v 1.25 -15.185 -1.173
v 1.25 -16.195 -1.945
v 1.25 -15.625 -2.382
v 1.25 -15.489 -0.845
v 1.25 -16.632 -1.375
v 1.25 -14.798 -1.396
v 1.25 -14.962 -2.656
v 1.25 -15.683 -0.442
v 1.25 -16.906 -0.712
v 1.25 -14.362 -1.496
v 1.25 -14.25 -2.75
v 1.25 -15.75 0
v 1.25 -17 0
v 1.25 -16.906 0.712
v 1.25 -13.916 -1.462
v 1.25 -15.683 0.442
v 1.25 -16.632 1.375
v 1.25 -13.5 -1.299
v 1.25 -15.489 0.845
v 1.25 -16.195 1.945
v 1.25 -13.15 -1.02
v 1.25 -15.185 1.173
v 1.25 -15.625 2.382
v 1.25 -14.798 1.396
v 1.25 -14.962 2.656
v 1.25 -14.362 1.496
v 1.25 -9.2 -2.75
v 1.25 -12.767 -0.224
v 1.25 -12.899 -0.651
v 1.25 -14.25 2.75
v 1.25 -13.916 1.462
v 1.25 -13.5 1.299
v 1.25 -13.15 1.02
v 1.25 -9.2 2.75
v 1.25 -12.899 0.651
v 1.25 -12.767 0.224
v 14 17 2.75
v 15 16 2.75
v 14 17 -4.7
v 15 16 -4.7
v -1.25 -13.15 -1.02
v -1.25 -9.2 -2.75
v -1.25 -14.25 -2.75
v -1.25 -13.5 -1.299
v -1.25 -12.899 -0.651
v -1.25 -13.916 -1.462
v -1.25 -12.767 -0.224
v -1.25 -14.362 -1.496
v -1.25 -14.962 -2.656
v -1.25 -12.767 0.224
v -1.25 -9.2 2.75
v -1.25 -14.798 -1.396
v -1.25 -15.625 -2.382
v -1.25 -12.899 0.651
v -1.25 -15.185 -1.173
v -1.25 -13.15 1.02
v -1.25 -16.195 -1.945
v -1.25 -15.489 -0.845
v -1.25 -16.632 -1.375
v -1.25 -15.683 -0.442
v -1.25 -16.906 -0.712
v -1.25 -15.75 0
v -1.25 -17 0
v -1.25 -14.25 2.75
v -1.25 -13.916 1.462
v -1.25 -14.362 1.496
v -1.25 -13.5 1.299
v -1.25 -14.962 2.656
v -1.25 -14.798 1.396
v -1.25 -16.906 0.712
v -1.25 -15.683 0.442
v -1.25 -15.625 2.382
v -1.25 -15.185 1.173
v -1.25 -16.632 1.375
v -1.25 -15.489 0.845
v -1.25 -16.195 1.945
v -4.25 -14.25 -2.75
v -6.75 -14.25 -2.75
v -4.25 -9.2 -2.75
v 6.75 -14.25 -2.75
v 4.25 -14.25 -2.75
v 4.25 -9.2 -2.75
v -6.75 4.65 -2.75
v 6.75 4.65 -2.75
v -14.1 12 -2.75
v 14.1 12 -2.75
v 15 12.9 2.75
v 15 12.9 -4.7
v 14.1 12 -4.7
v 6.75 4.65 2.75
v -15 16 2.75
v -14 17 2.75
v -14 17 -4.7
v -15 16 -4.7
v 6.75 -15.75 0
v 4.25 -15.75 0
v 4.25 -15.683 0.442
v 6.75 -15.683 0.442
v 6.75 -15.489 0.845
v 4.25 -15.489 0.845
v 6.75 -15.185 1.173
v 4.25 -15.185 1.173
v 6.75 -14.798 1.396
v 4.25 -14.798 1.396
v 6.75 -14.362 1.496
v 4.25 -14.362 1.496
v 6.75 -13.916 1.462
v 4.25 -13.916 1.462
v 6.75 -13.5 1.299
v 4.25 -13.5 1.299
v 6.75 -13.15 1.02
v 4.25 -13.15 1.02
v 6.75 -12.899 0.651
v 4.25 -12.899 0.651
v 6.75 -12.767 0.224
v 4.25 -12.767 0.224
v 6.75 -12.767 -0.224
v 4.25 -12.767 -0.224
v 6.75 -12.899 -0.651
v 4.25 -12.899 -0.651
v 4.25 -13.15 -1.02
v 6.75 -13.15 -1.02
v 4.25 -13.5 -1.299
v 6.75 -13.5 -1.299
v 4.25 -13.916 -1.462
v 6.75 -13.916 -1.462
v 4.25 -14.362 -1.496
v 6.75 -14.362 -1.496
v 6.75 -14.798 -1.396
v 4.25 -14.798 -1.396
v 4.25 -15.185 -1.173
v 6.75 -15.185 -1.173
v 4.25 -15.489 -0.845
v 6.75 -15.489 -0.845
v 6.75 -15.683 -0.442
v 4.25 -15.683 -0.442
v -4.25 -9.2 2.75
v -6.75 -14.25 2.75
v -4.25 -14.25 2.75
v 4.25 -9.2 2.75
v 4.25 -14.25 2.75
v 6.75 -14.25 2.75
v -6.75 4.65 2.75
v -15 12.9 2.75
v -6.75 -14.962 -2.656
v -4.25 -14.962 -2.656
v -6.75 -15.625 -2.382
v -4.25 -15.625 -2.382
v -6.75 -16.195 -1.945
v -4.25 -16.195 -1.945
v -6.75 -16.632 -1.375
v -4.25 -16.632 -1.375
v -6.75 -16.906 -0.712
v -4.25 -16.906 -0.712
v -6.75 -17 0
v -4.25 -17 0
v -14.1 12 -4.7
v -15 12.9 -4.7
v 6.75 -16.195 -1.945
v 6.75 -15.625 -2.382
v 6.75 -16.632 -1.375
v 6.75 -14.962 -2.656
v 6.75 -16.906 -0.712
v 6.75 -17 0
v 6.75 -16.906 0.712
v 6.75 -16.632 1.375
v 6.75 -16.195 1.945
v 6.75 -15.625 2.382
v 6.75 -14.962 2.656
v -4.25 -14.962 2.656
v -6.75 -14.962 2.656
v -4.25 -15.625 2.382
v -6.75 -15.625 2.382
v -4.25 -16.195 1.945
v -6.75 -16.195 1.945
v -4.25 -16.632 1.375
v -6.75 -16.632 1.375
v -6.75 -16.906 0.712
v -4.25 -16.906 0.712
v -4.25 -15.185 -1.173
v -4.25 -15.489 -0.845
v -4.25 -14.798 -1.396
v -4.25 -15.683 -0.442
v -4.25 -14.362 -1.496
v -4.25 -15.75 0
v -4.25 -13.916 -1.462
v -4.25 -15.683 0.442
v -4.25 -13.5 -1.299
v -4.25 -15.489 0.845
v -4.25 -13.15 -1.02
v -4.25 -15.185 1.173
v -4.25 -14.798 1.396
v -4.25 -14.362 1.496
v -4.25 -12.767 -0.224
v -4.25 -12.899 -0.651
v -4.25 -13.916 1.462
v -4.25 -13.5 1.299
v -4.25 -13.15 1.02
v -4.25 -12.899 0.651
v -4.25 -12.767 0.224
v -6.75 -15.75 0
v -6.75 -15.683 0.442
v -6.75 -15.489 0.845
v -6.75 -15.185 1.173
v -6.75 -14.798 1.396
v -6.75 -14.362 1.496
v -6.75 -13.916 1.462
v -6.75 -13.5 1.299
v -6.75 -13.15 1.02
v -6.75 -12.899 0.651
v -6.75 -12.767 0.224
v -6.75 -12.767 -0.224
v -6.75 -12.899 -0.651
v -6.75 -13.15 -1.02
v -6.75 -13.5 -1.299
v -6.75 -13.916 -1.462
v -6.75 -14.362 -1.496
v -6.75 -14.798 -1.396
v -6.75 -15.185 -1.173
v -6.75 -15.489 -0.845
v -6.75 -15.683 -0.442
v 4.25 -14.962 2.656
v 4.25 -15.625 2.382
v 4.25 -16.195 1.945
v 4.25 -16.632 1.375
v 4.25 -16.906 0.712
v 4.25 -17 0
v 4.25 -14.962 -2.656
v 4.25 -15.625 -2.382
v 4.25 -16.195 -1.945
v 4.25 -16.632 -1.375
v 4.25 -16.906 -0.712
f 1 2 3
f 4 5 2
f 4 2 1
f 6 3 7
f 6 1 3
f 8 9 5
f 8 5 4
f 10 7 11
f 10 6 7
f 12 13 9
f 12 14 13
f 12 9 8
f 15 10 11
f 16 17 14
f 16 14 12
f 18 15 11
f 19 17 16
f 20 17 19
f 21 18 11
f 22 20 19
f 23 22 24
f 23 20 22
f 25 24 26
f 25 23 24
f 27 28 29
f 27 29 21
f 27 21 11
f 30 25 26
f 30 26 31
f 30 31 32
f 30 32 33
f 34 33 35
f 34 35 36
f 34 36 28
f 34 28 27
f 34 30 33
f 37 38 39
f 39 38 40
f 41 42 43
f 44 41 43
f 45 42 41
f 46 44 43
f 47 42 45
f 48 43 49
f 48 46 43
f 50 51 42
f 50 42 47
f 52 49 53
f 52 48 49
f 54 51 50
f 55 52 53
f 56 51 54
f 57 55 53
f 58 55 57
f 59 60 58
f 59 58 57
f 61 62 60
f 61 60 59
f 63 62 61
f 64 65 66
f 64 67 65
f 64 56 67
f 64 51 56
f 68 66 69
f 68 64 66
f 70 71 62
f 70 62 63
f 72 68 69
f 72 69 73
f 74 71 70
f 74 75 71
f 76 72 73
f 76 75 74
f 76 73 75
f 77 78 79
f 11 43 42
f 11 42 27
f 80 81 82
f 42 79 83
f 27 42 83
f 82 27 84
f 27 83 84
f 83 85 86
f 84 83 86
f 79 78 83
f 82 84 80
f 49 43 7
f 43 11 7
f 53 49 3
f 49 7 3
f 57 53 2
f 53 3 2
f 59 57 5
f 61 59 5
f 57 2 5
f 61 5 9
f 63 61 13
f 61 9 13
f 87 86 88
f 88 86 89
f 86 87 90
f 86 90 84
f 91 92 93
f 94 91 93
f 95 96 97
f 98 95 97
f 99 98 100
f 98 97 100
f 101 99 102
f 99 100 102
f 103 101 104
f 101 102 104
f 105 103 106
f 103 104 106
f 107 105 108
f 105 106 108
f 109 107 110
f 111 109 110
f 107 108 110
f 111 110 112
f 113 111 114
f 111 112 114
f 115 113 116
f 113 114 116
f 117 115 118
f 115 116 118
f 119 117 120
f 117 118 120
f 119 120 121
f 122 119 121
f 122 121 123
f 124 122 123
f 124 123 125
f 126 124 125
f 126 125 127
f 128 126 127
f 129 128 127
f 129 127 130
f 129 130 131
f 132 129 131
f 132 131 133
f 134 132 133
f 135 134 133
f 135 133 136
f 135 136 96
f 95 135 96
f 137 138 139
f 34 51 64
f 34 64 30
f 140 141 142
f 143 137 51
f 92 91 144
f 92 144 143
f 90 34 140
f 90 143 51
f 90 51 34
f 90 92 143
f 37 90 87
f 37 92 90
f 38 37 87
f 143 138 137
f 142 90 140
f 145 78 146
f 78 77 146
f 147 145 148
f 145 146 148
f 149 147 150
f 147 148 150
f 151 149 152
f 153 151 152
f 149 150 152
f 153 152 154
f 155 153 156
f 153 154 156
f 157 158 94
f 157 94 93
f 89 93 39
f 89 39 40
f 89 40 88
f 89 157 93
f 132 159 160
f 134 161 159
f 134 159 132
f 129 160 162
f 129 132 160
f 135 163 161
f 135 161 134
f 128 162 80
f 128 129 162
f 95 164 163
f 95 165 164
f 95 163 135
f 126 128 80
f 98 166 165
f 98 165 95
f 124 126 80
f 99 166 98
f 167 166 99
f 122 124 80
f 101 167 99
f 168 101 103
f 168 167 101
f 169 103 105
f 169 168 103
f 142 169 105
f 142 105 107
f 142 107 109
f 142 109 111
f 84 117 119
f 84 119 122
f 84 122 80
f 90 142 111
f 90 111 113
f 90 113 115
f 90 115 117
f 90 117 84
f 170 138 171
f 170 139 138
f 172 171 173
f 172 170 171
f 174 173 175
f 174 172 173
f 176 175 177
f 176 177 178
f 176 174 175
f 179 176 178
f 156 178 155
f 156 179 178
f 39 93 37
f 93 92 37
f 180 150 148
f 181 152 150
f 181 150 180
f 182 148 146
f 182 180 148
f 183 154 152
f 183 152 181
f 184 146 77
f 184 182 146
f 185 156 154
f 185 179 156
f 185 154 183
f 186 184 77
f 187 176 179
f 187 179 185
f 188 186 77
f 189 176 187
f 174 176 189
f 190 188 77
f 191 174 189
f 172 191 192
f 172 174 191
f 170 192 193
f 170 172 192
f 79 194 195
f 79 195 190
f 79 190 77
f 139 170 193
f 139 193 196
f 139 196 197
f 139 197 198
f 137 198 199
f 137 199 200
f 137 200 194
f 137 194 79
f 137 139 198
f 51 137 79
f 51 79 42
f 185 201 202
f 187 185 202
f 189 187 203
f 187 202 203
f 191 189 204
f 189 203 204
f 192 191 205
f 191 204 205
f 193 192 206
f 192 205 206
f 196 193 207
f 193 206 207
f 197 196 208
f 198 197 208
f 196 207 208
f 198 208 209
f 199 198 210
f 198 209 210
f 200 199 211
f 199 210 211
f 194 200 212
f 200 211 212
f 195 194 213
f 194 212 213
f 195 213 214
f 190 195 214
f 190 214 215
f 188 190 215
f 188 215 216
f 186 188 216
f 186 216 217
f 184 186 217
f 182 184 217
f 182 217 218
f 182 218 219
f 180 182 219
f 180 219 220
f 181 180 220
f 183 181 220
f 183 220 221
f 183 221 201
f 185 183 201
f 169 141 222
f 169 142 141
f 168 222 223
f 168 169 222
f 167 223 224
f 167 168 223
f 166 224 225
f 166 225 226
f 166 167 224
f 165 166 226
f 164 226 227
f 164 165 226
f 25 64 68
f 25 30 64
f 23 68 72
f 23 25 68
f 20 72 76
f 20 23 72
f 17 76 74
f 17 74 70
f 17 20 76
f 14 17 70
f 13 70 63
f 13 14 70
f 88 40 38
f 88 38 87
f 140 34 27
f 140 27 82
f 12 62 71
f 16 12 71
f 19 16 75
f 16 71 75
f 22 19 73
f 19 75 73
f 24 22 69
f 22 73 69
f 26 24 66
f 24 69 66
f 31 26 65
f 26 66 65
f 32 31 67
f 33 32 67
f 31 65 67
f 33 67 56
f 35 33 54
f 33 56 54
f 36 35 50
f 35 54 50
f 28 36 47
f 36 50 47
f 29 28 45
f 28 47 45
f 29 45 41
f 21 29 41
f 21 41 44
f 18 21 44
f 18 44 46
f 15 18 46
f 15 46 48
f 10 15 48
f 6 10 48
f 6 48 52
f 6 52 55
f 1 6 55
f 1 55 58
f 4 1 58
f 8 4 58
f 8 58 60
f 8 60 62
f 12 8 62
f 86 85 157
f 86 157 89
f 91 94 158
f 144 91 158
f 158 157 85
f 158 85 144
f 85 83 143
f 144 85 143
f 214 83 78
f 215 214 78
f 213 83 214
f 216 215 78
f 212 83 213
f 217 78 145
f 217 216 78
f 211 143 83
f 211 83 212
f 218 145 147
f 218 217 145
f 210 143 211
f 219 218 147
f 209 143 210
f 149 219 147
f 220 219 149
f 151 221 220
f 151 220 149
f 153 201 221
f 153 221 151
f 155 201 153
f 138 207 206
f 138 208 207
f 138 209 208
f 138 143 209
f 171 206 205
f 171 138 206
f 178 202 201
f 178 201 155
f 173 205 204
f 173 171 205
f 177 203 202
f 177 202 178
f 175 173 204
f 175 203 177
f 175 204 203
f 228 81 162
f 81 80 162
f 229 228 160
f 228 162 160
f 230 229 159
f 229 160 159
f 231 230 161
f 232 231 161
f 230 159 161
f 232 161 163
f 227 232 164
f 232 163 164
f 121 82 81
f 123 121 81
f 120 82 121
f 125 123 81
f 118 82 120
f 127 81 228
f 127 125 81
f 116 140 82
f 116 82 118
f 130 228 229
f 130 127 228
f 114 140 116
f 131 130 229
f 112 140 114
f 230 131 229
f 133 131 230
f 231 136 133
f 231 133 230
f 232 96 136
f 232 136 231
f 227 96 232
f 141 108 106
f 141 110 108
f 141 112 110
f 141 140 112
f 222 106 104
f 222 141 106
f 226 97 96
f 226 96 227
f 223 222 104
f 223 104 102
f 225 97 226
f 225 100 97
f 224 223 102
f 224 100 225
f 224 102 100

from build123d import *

# Parameters (mm, degrees)
F1_DEPTH = 2.75
F2_W     = 30
F2_H     = 5
F3_DEPTH = 1.95
F4_SIZE  = 8.24999
F5_SIZE  = 1
F6_R     = 2.74999
F8_D     = 3


# Not quite as in the source:
# - a fillet or chamfer is up to 0.001 mm smaller than in the source, because OpenCascade refuses the exact size


with BuildPart() as f1:
    # F0 (on Top) → F1 (new body, symmetric)
    with BuildSketch(Plane.XY):
        Polygon((-15, 17), (-15, 12), (-15, 4.65), (-6.75, 4.65), (-6.75, -17), (-4.25, -17), (-4.25, -9.2), (-1.25, -9.2), (-1.25, -17), (1.25, -17), (1.25, -9.2), (4.25, -9.2), (4.25, -17), (6.75, -17), (6.75, 4.65), (15, 4.65), (15, 12), (15, 17), align=None)
    extrude(amount=F1_DEPTH, both=True)

    # F2 (on face) → F3 (join)
    with BuildSketch(Plane(origin=(0, 0, -2.75), x_dir=(1, 0, 0), z_dir=(0, 0, -1))):
        with Locations((0, -14.5)):
            Rectangle(F2_W, F2_H)
    extrude(amount=F3_DEPTH)

    # F4 (size 8.25 in the source; OpenCascade refuses exactly that, so slightly less here)
    f4_edges = [f1.edges().sort_by_distance(p)[0] for p in [
        (-15, 4.65, 0),
        (15, 4.65, 0),
    ]]
    chamfer(f4_edges, length=F4_SIZE)

    # F5
    f5_edges = [f1.edges().sort_by_distance(p)[0] for p in [
        (15, 17, -0.975),
        (-15, 17, -0.975),
    ]]
    chamfer(f5_edges, length=F5_SIZE)

    # F6 (radius 2.75 in the source; OpenCascade refuses exactly that, so slightly less here)
    f6_edges = [f1.edges().sort_by_distance(p)[0] for p in [
        (5.5, -17, 2.75),
        (0, -17, 2.75),
        (-5.5, -17, 2.75),
        (5.5, -17, -2.75),
        (0, -17, -2.75),
        (-5.5, -17, -2.75),
    ]]
    fillet(f6_edges, radius=F6_R)

    # F8 (through all)
    with Locations(Plane.YZ.offset(6.75)):
        with Locations((-14.25, 0)):
            Hole(F8_D / 2)


solid = f1.part
